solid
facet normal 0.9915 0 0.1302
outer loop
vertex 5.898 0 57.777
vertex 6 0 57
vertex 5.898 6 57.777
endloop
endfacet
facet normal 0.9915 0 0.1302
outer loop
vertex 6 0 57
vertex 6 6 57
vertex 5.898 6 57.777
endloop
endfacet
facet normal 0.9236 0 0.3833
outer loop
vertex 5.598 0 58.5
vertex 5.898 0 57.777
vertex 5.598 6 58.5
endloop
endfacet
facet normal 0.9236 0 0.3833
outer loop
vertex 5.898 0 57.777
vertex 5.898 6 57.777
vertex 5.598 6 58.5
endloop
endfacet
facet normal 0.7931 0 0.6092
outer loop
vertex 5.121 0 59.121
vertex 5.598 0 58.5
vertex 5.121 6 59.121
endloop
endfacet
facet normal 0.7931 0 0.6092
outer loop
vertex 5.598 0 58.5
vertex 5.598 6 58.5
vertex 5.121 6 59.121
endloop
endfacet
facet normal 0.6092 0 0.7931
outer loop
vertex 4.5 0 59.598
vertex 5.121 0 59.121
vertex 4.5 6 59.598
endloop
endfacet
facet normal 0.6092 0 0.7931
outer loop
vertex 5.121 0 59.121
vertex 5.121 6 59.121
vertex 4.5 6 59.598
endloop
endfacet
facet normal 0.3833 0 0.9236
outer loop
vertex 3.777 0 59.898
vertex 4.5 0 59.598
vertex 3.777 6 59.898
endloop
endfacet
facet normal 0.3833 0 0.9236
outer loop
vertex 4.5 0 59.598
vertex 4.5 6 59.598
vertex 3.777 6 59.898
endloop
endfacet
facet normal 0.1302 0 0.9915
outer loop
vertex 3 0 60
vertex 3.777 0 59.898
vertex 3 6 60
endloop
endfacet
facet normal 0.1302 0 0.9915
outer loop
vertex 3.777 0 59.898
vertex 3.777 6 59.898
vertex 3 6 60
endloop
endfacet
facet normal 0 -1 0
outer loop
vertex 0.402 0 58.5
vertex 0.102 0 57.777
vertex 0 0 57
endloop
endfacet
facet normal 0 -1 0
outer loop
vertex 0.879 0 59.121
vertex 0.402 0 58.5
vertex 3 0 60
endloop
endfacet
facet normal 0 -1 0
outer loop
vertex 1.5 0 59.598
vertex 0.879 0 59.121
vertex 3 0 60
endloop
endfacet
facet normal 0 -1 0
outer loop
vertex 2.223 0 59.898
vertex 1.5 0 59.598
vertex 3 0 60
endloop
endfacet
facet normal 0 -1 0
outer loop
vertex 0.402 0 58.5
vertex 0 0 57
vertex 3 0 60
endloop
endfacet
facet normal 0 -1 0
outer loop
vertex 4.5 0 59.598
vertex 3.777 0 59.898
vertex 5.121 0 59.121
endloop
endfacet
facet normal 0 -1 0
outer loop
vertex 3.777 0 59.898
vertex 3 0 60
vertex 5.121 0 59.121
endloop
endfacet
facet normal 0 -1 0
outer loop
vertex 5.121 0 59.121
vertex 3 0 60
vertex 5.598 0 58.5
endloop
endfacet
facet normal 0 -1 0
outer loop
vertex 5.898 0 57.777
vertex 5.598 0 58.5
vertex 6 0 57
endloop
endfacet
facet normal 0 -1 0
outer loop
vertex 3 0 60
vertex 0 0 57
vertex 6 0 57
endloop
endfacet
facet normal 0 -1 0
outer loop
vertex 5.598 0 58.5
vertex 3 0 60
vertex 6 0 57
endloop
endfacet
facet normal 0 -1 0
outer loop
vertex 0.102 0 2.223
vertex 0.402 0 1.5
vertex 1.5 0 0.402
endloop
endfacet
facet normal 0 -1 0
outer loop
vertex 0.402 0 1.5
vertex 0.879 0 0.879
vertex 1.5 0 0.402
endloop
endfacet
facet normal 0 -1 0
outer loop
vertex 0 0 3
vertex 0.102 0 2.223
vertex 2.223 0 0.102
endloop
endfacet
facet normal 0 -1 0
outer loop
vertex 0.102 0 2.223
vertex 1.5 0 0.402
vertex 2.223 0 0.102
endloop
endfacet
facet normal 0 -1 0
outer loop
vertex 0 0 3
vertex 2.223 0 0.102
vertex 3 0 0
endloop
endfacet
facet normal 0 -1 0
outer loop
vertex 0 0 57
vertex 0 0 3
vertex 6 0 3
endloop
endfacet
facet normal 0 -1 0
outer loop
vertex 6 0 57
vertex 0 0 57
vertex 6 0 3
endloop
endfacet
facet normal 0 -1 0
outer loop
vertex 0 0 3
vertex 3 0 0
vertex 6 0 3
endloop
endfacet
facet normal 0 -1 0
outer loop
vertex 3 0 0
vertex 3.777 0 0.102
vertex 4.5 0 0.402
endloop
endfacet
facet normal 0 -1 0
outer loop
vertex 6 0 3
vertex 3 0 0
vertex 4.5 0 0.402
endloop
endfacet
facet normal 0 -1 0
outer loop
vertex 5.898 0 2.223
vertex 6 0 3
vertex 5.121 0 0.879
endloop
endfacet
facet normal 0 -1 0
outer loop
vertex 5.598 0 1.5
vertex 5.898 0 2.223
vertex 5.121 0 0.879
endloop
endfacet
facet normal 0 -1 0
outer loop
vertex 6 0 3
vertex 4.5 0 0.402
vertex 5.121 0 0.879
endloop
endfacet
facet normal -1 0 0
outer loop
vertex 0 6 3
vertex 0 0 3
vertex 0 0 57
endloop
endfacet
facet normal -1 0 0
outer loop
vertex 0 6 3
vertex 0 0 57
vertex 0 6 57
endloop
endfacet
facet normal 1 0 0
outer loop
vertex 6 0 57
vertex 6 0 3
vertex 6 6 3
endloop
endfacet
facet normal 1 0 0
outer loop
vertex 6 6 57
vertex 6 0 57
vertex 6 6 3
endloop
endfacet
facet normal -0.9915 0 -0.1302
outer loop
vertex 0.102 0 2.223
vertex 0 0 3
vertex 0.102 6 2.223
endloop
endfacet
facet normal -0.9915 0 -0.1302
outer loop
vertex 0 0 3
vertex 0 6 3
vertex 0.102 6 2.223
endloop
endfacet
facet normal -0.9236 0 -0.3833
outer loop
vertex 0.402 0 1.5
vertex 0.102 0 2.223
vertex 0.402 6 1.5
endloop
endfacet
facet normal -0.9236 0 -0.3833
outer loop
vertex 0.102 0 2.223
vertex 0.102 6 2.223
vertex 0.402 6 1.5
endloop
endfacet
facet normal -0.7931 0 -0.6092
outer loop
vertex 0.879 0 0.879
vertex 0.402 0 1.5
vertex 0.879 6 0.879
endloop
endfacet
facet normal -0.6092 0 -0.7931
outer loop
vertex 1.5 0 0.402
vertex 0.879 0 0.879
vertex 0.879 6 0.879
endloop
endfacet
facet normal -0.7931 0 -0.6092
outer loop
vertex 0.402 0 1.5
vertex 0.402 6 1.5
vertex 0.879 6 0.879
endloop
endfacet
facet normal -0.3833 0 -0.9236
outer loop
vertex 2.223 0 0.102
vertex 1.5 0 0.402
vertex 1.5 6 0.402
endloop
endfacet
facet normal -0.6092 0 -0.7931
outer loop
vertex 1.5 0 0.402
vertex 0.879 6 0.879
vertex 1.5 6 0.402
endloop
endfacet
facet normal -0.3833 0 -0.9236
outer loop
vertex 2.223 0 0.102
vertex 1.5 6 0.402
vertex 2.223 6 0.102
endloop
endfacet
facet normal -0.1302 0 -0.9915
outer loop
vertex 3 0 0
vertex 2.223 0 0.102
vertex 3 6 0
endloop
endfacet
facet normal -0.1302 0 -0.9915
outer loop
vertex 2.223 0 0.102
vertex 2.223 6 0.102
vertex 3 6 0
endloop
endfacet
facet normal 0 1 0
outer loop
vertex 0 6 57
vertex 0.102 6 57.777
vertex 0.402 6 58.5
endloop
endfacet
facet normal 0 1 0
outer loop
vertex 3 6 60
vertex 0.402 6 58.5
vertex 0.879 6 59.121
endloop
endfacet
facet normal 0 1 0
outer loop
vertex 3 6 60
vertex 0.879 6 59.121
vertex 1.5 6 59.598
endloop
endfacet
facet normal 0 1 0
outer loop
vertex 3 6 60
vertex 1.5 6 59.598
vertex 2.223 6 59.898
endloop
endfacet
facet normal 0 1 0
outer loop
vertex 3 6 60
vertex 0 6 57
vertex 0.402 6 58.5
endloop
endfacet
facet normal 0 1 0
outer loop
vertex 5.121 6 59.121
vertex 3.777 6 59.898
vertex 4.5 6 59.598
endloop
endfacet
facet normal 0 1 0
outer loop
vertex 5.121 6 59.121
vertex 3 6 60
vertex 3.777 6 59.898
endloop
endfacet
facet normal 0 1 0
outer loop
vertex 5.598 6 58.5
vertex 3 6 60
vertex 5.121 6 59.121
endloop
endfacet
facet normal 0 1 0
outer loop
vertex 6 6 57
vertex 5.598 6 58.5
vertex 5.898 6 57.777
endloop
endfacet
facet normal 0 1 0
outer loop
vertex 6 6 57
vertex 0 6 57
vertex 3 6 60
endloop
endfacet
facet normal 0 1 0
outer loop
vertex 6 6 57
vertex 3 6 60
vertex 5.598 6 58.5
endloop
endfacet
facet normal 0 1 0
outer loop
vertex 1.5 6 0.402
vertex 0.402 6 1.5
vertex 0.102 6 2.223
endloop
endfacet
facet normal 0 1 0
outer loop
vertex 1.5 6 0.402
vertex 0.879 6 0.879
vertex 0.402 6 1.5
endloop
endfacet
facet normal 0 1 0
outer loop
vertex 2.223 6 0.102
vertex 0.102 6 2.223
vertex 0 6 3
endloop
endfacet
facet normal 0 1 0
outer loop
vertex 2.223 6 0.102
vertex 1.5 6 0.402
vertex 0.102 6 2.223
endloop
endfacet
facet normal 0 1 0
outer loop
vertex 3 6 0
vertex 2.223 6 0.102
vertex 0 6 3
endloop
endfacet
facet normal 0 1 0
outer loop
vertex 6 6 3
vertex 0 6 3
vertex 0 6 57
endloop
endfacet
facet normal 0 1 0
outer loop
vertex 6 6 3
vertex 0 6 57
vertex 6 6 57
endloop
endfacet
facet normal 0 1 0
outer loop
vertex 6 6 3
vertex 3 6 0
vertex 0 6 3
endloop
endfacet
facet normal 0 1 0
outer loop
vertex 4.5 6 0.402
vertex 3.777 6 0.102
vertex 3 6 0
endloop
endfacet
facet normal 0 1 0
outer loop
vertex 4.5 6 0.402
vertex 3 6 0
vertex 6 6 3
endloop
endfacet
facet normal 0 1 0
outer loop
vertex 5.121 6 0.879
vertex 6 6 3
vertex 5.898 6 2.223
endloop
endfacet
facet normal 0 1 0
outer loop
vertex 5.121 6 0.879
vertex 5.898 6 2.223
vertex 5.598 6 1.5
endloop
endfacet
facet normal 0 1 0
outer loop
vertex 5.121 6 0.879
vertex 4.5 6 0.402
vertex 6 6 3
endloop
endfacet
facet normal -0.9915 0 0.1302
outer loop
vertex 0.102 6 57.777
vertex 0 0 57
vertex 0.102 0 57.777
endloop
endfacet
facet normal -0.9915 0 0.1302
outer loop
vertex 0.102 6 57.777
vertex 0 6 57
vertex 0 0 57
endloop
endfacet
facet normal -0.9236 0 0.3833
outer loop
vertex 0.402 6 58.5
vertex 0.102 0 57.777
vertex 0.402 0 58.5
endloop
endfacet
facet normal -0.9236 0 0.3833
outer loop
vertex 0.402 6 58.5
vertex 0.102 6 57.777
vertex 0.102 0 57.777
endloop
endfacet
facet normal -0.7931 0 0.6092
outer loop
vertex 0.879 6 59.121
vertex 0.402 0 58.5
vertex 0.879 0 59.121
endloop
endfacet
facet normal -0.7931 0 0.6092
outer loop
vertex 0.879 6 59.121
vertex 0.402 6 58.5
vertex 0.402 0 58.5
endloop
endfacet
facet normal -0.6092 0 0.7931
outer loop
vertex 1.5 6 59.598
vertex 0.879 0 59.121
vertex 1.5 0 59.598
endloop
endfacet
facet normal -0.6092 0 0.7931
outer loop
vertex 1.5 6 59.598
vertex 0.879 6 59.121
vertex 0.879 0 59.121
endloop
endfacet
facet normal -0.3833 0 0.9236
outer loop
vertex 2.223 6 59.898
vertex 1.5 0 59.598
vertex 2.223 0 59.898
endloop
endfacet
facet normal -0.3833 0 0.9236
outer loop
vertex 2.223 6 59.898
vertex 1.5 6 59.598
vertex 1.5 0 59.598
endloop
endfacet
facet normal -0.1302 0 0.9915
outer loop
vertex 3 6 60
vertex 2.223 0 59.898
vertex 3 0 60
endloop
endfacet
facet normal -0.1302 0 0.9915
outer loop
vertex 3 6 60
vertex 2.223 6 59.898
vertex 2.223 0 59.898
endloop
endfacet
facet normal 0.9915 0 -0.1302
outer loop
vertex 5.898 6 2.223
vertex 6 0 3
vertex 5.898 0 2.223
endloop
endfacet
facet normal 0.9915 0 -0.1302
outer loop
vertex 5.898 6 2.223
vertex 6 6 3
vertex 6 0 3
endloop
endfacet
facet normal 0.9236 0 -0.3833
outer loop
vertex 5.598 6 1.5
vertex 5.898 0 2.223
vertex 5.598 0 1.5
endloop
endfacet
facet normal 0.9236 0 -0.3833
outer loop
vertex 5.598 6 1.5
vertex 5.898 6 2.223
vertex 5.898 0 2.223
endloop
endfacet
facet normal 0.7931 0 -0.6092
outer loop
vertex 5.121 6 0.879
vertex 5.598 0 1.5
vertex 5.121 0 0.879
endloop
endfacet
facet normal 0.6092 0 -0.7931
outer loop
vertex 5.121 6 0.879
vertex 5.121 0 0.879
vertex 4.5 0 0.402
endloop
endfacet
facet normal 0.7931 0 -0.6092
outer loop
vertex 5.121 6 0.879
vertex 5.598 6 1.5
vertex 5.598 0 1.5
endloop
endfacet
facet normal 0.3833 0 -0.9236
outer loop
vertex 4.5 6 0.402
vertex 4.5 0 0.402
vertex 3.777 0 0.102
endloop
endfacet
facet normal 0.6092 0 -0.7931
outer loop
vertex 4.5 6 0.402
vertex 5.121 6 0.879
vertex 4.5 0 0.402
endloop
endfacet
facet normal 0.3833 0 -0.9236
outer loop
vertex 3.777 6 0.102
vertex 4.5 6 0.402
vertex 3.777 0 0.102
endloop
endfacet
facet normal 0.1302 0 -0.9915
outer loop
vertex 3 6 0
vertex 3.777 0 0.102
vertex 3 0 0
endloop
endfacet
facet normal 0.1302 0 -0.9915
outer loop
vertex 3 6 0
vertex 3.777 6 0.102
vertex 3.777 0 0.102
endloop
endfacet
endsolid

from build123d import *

# Parameters (mm, degrees)
ESQUISSE1_W          = 6
ESQUISSE1_H          = 6
BASE_EXTRUSION_DEPTH = 60
CONG_1_R             = 3


with BuildPart() as part:
    # Esquisse1 → Base-Extrusion (new body)
    with BuildSketch(Plane.XY):
        with Locations((3, 3)):
            Rectangle(ESQUISSE1_W, ESQUISSE1_H)
    extrude(amount=BASE_EXTRUSION_DEPTH)

    # Congé1
    cong_1_edges = [part.edges().sort_by_distance(p)[0] for p in [
        (6, 3, 0),
        (6, 3, 60),
        (0, 3, 0),
        (0, 3, 60),
    ]]
    fillet(cong_1_edges, radius=CONG_1_R - 0.0001)  # a hair under: the kernel refuses the full size


solid = part.part
